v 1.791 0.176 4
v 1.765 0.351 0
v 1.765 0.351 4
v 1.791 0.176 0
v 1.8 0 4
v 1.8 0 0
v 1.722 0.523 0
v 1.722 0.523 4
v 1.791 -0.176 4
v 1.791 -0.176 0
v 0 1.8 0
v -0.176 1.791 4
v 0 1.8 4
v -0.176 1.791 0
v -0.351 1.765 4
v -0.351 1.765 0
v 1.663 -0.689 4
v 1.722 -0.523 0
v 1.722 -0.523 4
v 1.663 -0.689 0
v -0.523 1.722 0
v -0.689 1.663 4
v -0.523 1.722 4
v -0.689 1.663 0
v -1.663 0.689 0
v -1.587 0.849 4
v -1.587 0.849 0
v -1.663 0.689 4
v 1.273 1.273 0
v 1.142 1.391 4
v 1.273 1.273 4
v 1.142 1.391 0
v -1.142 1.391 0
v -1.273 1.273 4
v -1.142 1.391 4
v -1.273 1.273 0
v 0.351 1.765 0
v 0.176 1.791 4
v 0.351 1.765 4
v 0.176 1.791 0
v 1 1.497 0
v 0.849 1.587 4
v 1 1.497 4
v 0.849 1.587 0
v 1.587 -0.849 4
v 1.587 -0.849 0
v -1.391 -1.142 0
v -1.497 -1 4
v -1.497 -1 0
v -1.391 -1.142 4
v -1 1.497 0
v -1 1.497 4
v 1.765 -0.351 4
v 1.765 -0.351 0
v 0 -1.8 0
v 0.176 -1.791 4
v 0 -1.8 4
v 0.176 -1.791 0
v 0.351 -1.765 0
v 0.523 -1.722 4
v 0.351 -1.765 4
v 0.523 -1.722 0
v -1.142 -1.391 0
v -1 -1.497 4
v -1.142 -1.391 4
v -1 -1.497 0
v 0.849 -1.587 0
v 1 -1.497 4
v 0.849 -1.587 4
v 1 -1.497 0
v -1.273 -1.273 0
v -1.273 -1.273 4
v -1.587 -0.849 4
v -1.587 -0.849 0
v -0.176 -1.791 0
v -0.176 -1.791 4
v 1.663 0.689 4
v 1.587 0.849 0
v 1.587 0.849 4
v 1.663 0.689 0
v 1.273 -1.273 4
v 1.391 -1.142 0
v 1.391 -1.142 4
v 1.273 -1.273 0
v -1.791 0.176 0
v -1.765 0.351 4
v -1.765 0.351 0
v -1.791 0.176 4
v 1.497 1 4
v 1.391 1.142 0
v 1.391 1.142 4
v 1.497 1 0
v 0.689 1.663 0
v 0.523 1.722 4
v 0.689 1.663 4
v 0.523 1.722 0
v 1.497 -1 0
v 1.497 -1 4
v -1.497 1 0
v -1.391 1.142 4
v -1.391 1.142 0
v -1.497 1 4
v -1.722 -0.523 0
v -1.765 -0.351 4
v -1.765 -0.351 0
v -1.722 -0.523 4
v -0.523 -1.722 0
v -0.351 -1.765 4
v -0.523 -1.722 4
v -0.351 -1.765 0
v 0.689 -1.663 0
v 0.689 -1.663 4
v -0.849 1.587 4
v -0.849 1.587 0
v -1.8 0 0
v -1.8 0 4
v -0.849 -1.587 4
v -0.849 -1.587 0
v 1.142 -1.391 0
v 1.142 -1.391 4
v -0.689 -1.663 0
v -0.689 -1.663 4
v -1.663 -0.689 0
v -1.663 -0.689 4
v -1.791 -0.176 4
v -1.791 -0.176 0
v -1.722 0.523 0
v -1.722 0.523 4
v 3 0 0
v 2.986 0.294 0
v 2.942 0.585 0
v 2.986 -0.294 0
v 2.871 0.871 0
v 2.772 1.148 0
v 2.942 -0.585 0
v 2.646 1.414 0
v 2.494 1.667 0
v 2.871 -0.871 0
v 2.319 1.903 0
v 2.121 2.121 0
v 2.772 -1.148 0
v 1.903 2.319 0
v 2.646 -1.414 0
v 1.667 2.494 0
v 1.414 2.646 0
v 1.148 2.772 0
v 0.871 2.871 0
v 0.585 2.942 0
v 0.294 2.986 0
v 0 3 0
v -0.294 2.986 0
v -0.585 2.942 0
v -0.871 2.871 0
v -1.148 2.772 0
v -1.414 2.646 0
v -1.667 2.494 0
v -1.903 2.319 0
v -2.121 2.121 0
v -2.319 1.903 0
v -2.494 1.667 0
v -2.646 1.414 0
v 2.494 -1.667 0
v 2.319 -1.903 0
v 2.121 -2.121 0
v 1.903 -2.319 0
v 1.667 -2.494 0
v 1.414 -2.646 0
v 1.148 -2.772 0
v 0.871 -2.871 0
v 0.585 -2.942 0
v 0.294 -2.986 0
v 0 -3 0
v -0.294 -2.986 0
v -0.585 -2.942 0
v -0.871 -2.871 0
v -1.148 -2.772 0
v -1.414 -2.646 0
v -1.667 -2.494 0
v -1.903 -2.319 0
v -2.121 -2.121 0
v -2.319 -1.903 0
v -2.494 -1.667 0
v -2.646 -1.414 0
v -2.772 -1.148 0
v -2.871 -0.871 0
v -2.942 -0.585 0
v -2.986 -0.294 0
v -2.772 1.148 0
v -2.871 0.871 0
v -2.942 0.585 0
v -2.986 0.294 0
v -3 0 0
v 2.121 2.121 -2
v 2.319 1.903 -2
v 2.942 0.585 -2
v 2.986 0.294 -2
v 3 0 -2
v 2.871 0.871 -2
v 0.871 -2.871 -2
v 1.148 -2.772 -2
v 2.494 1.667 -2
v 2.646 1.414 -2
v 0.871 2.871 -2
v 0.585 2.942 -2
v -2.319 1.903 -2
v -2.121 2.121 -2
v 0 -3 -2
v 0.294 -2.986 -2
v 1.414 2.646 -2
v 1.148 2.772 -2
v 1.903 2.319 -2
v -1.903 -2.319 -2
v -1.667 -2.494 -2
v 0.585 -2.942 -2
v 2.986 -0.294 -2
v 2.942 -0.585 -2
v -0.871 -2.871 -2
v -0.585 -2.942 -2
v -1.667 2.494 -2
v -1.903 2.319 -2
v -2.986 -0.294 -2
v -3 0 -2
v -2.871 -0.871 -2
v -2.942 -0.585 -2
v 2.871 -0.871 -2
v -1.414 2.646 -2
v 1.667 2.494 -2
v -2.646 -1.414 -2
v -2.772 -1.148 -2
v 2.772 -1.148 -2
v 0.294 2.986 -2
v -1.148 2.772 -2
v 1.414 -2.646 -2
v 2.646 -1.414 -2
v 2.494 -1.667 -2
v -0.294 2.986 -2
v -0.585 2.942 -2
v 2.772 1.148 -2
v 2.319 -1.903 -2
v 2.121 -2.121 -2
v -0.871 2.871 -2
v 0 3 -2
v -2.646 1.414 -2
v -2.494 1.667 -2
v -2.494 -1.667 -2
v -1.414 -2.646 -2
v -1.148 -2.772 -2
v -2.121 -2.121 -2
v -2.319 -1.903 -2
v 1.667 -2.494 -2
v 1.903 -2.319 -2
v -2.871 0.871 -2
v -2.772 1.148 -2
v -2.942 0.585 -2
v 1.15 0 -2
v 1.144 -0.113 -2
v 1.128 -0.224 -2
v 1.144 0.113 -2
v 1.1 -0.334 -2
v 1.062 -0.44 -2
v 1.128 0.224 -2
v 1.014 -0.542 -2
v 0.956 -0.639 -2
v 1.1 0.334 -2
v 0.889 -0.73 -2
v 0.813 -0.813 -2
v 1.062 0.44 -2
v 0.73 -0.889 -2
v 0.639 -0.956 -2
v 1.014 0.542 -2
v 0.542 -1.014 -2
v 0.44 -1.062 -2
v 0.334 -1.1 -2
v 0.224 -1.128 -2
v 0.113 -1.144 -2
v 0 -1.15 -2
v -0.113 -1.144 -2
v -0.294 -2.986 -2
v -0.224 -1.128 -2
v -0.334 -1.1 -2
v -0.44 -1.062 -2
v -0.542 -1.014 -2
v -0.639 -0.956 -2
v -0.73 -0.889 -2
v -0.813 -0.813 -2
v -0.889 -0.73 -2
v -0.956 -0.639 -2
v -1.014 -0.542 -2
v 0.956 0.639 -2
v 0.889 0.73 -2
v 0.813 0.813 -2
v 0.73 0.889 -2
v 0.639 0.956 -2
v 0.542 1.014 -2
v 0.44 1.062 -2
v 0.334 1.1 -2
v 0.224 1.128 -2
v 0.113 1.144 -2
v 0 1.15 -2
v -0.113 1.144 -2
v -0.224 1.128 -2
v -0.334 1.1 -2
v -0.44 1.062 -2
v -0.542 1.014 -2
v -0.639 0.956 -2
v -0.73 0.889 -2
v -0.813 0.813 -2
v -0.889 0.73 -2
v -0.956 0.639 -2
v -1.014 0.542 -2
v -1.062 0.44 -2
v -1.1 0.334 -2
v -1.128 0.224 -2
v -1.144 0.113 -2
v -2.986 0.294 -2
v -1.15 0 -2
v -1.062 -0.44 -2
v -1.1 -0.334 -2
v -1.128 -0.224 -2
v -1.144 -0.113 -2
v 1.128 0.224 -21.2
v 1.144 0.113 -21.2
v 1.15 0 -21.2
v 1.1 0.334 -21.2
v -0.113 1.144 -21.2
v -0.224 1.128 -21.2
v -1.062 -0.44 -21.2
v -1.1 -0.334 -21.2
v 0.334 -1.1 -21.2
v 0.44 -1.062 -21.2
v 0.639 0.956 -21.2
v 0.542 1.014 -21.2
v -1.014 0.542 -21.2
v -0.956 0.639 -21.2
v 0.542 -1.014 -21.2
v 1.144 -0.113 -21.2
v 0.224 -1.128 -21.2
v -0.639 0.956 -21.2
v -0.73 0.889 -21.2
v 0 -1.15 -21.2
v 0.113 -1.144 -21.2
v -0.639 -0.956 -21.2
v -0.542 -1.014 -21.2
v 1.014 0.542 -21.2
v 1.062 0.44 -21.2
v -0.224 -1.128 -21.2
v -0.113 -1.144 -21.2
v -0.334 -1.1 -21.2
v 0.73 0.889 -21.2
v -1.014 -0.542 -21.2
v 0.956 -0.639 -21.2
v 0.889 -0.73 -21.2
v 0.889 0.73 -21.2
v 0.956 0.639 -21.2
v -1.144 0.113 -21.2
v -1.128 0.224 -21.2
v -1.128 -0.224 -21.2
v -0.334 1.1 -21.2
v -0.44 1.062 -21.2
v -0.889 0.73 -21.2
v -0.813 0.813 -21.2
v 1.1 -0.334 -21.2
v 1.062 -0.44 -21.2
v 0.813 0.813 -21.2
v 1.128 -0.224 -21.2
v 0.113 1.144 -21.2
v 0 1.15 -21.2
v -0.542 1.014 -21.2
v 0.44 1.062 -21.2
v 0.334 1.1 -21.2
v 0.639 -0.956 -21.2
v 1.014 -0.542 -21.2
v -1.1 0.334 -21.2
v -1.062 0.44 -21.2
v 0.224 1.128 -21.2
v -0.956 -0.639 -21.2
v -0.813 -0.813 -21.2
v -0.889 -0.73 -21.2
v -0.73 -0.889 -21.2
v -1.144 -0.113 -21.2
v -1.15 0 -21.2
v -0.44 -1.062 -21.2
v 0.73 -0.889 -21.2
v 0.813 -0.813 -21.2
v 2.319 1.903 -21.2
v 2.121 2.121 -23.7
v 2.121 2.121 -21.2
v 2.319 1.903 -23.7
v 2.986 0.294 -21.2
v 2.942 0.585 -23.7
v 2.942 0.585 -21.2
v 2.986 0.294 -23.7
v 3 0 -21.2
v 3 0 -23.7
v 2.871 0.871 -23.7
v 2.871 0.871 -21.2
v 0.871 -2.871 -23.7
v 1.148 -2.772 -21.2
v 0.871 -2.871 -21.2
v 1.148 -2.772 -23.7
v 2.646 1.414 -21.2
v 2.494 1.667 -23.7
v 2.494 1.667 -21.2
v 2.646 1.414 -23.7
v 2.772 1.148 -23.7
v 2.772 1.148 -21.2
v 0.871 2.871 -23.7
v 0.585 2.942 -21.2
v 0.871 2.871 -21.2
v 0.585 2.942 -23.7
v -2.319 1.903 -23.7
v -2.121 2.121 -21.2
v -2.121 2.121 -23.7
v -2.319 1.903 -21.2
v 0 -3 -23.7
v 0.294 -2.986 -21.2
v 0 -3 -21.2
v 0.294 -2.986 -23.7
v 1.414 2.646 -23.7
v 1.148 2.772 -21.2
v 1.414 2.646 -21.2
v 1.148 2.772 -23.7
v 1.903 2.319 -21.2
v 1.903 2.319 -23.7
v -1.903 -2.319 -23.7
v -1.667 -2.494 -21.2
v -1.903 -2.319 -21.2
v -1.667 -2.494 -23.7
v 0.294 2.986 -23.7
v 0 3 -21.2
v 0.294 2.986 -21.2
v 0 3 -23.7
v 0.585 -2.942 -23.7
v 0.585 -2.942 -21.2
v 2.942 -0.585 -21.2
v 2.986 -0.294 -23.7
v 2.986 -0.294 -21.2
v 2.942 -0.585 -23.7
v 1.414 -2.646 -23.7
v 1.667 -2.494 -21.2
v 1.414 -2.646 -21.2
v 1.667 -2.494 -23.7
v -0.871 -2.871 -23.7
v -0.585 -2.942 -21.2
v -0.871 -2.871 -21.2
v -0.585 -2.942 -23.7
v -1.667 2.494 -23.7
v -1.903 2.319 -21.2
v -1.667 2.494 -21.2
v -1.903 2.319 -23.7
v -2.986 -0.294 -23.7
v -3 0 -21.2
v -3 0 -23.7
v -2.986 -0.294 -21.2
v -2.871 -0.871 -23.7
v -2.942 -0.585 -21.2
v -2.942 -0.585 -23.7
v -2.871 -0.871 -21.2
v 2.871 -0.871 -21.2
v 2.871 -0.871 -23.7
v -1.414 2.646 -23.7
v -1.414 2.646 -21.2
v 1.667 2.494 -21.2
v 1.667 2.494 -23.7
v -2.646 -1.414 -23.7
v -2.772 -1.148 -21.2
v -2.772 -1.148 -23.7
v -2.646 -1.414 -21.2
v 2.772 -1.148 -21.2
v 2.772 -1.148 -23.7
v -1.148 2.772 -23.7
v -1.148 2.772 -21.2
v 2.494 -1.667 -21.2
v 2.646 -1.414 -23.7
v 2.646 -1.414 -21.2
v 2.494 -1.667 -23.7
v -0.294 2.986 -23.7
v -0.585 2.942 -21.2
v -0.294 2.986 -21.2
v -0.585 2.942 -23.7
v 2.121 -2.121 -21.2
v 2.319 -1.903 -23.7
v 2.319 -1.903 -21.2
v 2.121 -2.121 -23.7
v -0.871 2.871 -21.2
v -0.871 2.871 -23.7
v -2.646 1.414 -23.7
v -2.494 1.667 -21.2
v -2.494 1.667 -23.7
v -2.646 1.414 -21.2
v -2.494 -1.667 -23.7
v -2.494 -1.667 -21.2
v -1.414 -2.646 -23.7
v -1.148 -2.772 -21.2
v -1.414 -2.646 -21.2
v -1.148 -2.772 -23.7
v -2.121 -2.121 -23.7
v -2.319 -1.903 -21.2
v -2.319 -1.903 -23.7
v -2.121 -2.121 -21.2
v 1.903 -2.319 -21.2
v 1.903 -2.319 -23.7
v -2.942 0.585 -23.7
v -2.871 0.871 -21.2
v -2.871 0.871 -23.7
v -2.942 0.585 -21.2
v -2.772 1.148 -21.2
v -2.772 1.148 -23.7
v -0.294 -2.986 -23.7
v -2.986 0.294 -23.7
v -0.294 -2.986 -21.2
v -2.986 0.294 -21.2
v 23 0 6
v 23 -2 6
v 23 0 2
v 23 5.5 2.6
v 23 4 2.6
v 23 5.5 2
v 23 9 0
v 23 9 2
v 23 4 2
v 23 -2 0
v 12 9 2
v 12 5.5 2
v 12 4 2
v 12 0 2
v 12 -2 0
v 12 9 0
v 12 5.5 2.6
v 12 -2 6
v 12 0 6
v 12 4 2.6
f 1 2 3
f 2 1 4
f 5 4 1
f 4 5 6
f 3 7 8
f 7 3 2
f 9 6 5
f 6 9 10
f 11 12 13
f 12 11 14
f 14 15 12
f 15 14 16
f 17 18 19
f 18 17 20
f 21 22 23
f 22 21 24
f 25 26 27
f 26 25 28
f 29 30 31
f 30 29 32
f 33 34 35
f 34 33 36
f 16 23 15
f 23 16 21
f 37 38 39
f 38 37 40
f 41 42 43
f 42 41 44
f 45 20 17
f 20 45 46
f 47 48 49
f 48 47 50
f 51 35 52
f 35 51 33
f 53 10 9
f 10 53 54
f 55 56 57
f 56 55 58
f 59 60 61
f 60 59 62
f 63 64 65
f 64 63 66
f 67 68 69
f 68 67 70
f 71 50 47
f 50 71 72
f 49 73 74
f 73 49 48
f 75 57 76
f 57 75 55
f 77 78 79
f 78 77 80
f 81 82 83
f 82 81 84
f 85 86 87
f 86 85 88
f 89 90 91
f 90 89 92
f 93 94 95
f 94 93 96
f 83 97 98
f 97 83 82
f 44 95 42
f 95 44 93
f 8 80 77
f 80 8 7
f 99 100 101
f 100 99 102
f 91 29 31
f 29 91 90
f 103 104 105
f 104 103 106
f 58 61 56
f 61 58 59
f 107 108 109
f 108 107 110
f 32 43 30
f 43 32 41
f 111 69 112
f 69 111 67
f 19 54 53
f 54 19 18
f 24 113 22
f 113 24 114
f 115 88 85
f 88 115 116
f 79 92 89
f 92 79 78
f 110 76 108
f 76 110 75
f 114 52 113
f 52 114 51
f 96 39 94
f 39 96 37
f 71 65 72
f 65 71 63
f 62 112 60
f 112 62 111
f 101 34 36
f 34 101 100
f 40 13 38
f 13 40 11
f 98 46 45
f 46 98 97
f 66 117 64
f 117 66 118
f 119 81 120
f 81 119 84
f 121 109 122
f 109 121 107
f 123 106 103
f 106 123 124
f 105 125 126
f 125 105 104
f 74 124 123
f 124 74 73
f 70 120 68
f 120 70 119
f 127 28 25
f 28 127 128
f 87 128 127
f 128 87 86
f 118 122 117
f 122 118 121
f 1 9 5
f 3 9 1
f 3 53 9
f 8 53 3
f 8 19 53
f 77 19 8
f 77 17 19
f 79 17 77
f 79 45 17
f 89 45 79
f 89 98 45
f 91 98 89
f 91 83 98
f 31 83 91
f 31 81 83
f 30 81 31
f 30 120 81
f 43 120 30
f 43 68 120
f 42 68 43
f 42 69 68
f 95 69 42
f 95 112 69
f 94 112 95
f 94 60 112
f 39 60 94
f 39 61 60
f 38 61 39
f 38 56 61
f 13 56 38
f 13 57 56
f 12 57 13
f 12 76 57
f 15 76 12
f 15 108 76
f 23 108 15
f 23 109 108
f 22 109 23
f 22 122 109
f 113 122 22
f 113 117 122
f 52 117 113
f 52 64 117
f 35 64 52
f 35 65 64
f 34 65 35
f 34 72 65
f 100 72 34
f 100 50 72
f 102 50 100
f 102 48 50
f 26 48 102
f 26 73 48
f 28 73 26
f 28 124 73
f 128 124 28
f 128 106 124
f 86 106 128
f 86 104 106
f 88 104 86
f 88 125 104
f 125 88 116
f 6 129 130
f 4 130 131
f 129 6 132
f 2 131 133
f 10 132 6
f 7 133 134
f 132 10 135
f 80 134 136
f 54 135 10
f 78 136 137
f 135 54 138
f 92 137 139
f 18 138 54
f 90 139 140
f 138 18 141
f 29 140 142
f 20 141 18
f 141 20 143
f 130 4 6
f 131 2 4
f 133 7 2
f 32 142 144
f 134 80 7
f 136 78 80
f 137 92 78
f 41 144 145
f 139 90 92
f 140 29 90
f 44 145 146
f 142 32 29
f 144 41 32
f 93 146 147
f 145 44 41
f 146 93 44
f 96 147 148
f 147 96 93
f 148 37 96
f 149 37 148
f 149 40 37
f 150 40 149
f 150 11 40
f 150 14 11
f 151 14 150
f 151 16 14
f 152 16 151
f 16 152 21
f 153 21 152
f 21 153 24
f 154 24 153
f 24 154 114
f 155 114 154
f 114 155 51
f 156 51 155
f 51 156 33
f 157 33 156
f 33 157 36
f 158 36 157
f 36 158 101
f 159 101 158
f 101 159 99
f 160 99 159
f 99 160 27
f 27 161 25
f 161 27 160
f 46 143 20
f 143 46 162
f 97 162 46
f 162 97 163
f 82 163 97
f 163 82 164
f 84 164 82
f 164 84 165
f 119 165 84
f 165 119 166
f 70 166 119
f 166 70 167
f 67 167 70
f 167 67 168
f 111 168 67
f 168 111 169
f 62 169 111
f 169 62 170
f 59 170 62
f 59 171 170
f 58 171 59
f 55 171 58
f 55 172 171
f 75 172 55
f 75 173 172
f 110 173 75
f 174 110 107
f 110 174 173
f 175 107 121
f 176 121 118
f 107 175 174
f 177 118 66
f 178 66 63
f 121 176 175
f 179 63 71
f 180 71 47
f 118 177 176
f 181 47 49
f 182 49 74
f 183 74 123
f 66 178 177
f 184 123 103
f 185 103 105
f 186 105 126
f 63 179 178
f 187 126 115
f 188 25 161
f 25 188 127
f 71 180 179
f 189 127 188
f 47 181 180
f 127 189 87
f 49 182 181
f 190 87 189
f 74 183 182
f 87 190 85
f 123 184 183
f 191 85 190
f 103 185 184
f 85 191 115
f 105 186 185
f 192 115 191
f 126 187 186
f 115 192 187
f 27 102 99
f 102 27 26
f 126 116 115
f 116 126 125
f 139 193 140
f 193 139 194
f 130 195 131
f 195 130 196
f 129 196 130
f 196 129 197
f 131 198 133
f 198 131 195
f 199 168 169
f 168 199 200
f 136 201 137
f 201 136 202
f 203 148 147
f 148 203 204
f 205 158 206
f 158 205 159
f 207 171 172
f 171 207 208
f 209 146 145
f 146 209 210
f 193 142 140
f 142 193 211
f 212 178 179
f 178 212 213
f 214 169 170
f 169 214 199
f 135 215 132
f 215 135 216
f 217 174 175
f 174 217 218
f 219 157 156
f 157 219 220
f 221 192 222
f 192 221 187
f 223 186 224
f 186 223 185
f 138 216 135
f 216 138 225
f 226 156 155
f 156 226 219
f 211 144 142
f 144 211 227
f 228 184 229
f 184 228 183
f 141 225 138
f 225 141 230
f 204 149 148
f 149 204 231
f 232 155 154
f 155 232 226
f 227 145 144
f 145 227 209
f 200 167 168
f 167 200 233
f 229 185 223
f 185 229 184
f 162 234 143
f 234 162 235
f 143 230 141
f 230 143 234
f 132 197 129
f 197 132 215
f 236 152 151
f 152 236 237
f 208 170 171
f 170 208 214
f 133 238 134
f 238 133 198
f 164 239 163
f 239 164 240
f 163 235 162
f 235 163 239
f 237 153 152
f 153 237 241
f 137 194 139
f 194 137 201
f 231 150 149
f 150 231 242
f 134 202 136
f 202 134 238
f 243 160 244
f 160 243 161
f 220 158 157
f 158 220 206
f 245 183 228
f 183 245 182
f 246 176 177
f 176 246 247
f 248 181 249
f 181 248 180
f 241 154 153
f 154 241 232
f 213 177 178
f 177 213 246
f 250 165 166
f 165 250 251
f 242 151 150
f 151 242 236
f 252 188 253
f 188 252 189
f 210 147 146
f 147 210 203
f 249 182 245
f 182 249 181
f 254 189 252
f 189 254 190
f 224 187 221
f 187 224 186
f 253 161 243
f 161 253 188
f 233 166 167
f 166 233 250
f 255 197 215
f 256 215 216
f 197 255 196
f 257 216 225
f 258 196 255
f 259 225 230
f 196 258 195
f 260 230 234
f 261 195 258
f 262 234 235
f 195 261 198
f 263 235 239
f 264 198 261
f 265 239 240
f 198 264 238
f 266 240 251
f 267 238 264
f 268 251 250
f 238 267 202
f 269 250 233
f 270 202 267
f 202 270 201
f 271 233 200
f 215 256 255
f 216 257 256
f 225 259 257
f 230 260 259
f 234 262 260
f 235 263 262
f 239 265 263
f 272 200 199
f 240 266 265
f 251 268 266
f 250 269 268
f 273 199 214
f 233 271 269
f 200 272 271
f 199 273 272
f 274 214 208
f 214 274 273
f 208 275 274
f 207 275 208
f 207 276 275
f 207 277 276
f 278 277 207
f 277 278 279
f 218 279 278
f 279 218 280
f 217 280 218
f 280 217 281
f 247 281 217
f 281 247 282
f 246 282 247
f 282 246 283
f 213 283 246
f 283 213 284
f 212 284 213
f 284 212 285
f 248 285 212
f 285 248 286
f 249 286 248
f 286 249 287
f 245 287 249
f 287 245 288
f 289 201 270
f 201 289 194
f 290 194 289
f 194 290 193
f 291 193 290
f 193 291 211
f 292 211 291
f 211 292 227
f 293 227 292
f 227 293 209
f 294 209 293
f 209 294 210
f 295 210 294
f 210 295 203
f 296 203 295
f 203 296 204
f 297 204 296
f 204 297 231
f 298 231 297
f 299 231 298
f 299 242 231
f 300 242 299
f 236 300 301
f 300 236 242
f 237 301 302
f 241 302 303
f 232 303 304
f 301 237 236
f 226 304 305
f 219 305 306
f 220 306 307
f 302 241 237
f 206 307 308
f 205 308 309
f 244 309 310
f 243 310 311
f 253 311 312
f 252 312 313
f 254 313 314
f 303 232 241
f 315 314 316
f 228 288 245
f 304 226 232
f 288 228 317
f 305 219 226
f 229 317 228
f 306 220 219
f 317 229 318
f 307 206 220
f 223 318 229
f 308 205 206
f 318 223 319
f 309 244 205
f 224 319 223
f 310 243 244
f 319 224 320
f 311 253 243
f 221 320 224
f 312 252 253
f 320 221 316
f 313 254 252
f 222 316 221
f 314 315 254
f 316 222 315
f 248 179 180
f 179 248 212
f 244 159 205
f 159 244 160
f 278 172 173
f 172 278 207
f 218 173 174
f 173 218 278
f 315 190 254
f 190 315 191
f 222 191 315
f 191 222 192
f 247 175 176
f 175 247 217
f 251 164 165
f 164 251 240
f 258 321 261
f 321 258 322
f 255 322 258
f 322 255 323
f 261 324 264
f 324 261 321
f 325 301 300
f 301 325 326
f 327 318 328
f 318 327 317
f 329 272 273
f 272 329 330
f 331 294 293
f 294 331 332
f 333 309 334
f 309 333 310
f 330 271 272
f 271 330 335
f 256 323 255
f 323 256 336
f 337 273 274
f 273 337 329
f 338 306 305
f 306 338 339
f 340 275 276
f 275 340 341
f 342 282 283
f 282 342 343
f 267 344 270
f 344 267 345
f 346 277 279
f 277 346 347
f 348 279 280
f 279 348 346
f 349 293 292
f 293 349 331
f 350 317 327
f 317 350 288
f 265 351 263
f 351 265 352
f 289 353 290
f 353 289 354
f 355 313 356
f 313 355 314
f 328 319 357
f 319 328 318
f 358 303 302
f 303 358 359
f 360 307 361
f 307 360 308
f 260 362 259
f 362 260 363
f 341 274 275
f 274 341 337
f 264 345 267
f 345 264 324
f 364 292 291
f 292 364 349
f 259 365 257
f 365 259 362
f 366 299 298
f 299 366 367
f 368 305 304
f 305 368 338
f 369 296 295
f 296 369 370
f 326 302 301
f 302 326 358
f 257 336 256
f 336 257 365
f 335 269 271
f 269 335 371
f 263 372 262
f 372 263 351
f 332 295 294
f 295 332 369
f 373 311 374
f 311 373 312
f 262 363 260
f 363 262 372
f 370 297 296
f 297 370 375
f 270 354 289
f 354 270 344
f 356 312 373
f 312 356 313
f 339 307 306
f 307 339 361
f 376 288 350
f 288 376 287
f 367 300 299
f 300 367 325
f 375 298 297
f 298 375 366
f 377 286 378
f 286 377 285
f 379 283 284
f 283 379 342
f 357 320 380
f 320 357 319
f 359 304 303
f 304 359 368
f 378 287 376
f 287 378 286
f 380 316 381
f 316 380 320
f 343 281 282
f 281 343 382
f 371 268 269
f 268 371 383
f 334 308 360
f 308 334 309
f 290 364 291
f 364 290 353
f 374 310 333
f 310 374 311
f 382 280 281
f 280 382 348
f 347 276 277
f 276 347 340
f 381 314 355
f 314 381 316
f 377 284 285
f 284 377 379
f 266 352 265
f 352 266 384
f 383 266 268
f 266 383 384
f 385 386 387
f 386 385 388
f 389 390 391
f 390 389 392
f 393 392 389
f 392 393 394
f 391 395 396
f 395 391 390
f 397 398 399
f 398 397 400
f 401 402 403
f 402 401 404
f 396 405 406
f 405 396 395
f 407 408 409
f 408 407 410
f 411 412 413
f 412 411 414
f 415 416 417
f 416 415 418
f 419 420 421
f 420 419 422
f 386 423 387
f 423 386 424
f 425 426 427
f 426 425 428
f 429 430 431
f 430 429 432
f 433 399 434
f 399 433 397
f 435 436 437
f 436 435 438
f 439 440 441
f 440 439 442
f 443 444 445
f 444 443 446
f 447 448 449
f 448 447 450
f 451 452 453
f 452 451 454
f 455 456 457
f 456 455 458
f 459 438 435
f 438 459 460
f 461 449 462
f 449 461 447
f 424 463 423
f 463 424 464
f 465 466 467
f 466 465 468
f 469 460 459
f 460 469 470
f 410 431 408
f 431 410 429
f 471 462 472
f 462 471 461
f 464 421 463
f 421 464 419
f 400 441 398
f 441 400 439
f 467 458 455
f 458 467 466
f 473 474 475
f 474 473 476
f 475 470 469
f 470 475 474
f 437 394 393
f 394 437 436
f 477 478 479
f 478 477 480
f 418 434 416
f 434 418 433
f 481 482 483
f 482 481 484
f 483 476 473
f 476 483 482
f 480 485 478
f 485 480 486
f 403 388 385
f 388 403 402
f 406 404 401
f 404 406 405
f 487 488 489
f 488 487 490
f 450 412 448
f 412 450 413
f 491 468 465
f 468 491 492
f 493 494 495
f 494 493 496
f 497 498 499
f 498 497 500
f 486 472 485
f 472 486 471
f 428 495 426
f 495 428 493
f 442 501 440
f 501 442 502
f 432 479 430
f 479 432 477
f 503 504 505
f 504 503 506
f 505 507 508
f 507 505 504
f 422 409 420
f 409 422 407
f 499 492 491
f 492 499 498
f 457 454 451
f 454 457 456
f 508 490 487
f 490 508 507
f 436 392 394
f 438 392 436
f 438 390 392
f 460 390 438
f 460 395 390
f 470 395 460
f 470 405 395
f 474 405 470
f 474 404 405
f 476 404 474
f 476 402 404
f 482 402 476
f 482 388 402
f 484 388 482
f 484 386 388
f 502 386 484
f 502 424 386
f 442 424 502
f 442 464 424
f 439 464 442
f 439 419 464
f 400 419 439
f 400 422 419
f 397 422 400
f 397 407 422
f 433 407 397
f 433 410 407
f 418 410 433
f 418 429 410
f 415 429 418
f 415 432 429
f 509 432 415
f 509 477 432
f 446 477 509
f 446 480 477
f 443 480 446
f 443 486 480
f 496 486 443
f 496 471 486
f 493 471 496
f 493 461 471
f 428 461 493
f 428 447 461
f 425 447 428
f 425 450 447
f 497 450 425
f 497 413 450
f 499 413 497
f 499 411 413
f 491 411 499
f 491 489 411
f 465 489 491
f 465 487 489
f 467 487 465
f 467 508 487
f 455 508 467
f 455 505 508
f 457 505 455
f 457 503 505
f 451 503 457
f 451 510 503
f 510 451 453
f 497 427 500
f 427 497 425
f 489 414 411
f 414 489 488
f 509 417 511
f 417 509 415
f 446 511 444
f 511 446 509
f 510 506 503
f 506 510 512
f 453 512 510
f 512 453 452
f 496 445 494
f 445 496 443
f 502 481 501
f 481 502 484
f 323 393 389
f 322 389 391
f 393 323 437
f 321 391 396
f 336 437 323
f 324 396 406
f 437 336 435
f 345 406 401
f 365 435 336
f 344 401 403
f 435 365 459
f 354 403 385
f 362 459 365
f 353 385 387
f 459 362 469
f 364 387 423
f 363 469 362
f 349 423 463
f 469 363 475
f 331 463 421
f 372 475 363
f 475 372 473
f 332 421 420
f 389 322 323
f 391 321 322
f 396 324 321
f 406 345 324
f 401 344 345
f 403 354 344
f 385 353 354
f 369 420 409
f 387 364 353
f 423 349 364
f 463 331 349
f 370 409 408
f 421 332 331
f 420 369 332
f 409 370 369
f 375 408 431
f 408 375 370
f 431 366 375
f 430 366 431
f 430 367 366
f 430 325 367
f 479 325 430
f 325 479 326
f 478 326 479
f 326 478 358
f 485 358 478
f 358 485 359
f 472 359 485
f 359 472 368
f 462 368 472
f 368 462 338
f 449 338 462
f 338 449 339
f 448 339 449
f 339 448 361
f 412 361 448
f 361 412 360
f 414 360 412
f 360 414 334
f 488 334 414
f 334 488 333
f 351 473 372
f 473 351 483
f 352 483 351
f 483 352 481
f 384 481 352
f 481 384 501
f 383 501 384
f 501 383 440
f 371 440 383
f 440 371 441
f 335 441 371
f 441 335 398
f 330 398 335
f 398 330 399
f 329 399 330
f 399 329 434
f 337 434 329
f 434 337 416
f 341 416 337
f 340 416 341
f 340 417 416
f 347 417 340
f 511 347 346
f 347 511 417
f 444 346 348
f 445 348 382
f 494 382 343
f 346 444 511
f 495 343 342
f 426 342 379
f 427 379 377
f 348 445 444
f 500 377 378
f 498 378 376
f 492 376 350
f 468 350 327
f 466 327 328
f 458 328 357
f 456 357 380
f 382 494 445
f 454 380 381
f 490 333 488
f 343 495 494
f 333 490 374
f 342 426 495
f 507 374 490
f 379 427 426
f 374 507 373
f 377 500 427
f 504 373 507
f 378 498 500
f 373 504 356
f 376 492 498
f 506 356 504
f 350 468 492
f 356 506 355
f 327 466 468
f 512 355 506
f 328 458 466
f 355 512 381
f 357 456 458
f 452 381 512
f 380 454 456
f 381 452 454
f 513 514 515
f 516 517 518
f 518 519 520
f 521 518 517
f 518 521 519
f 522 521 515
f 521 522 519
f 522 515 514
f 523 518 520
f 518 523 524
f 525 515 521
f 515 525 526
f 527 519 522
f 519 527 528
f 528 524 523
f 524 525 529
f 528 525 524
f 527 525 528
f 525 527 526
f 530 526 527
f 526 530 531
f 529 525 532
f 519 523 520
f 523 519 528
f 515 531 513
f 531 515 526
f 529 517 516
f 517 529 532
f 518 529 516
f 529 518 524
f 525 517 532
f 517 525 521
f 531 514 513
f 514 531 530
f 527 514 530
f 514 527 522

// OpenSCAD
$fn=64;

//button
translate([0,0,0]){
    cylinder(d=3.6, h=4);
    translate([0,0,-2]) cylinder(d=6, h=2);
    translate([0,0,-2-20]) cylinder(d=2.3, h=20);
    translate([0,0,-3.7-20]) cylinder(d=6, h=2.5);
}

//button clip
translate([12,0,0]) {
    length = 11;
    //length = 10 * 8;
    cube([length,9, 2]);
    translate([0,4,2]) cube([length,1.5, 0.6]);
    translate([0,-2,0]) cube([length,2, 6]);   
}
